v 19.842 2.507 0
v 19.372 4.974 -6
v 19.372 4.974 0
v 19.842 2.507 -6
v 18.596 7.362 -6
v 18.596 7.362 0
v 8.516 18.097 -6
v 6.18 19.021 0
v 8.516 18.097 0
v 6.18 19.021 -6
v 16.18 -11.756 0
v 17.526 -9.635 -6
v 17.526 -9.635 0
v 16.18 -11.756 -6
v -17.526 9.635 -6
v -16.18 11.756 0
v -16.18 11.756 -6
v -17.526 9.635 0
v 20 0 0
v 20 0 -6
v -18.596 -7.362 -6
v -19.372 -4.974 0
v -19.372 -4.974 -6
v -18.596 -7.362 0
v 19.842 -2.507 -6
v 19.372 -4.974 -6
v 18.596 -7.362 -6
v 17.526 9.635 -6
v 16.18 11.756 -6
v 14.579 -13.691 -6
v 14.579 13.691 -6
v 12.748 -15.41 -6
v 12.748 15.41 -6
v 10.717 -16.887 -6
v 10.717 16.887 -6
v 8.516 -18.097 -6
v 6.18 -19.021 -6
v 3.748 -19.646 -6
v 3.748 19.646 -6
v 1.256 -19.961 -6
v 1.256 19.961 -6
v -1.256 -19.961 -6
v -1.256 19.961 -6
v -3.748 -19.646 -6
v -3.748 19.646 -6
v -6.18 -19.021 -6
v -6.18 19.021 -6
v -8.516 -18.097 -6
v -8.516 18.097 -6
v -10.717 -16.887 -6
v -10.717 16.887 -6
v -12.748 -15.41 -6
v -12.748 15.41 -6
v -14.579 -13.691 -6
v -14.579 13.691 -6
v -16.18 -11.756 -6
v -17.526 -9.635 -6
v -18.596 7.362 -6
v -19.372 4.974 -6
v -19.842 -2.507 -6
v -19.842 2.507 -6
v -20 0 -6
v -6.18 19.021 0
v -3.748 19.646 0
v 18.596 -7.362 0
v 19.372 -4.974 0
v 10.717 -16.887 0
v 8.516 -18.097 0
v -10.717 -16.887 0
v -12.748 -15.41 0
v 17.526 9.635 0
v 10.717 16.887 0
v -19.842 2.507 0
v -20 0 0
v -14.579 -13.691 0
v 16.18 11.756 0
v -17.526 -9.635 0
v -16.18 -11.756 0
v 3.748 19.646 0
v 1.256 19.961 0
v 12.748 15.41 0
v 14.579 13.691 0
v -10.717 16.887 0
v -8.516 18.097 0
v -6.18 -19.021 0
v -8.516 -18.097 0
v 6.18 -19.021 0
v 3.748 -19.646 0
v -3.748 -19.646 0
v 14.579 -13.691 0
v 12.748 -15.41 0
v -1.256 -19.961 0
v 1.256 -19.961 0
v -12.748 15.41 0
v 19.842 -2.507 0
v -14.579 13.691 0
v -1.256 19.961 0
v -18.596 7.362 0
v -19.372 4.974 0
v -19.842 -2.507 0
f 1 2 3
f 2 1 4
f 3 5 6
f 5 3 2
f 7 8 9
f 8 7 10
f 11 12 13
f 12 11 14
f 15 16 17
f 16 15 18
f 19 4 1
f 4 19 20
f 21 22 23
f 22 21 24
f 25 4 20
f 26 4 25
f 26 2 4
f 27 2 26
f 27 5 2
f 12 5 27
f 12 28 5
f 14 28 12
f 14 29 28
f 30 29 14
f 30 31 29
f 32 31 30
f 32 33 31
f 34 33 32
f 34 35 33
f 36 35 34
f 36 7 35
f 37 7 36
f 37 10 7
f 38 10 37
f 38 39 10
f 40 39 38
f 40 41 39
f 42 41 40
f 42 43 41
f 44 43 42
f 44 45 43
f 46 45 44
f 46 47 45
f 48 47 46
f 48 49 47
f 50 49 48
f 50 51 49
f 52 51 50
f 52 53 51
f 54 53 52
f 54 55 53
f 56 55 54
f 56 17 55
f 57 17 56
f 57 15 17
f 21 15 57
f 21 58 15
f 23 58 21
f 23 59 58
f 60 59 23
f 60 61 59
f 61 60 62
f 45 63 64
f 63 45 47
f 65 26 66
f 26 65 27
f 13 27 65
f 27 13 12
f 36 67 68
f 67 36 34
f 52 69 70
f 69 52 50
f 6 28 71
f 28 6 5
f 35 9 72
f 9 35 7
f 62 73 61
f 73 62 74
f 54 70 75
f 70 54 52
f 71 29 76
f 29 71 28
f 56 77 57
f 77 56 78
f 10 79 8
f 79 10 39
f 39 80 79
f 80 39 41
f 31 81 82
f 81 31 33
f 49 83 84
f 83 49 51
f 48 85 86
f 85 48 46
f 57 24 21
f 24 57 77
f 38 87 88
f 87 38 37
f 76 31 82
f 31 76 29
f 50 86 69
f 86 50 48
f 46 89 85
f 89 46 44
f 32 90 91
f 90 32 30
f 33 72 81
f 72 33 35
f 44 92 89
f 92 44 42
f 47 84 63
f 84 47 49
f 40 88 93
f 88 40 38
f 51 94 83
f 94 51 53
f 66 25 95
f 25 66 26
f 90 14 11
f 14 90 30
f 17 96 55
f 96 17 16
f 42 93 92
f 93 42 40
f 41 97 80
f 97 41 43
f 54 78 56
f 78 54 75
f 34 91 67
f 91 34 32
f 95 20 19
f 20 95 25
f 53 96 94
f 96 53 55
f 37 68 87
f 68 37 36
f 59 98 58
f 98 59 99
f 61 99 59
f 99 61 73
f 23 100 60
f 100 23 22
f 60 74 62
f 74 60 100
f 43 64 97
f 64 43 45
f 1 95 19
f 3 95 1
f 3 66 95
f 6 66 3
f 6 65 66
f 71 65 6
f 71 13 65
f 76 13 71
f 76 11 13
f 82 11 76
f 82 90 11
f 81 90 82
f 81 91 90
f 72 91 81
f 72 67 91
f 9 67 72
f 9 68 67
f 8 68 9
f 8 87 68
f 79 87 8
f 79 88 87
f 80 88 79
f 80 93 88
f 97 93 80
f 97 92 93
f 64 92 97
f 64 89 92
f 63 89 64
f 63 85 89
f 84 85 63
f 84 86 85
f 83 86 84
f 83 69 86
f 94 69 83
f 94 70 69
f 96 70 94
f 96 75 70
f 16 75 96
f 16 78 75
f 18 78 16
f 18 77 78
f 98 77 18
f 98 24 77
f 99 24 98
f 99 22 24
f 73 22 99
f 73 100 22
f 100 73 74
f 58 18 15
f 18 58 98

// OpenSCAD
$fn = 50;


difference() {
	union() {
		cylinder(h = 0, r = 12.5000000000);
		translate(v = [0, 0, -6.0000000000]) {
			cylinder(h = 6, r = 20.0000000000);
		}
	}
	union() {
		#translate(v = [8.0000000000, 0.0000000000, 0]) {
			cylinder(h = 0, r = 3.2500000000);
		}
		#translate(v = [-4.0000000000, 6.9282032303, 0]) {
			cylinder(h = 0, r = 3.2500000000);
		}
		#translate(v = [-4.0000000000, -6.9282032303, 0]) {
			cylinder(h = 0, r = 3.2500000000);
		}
	}
}
